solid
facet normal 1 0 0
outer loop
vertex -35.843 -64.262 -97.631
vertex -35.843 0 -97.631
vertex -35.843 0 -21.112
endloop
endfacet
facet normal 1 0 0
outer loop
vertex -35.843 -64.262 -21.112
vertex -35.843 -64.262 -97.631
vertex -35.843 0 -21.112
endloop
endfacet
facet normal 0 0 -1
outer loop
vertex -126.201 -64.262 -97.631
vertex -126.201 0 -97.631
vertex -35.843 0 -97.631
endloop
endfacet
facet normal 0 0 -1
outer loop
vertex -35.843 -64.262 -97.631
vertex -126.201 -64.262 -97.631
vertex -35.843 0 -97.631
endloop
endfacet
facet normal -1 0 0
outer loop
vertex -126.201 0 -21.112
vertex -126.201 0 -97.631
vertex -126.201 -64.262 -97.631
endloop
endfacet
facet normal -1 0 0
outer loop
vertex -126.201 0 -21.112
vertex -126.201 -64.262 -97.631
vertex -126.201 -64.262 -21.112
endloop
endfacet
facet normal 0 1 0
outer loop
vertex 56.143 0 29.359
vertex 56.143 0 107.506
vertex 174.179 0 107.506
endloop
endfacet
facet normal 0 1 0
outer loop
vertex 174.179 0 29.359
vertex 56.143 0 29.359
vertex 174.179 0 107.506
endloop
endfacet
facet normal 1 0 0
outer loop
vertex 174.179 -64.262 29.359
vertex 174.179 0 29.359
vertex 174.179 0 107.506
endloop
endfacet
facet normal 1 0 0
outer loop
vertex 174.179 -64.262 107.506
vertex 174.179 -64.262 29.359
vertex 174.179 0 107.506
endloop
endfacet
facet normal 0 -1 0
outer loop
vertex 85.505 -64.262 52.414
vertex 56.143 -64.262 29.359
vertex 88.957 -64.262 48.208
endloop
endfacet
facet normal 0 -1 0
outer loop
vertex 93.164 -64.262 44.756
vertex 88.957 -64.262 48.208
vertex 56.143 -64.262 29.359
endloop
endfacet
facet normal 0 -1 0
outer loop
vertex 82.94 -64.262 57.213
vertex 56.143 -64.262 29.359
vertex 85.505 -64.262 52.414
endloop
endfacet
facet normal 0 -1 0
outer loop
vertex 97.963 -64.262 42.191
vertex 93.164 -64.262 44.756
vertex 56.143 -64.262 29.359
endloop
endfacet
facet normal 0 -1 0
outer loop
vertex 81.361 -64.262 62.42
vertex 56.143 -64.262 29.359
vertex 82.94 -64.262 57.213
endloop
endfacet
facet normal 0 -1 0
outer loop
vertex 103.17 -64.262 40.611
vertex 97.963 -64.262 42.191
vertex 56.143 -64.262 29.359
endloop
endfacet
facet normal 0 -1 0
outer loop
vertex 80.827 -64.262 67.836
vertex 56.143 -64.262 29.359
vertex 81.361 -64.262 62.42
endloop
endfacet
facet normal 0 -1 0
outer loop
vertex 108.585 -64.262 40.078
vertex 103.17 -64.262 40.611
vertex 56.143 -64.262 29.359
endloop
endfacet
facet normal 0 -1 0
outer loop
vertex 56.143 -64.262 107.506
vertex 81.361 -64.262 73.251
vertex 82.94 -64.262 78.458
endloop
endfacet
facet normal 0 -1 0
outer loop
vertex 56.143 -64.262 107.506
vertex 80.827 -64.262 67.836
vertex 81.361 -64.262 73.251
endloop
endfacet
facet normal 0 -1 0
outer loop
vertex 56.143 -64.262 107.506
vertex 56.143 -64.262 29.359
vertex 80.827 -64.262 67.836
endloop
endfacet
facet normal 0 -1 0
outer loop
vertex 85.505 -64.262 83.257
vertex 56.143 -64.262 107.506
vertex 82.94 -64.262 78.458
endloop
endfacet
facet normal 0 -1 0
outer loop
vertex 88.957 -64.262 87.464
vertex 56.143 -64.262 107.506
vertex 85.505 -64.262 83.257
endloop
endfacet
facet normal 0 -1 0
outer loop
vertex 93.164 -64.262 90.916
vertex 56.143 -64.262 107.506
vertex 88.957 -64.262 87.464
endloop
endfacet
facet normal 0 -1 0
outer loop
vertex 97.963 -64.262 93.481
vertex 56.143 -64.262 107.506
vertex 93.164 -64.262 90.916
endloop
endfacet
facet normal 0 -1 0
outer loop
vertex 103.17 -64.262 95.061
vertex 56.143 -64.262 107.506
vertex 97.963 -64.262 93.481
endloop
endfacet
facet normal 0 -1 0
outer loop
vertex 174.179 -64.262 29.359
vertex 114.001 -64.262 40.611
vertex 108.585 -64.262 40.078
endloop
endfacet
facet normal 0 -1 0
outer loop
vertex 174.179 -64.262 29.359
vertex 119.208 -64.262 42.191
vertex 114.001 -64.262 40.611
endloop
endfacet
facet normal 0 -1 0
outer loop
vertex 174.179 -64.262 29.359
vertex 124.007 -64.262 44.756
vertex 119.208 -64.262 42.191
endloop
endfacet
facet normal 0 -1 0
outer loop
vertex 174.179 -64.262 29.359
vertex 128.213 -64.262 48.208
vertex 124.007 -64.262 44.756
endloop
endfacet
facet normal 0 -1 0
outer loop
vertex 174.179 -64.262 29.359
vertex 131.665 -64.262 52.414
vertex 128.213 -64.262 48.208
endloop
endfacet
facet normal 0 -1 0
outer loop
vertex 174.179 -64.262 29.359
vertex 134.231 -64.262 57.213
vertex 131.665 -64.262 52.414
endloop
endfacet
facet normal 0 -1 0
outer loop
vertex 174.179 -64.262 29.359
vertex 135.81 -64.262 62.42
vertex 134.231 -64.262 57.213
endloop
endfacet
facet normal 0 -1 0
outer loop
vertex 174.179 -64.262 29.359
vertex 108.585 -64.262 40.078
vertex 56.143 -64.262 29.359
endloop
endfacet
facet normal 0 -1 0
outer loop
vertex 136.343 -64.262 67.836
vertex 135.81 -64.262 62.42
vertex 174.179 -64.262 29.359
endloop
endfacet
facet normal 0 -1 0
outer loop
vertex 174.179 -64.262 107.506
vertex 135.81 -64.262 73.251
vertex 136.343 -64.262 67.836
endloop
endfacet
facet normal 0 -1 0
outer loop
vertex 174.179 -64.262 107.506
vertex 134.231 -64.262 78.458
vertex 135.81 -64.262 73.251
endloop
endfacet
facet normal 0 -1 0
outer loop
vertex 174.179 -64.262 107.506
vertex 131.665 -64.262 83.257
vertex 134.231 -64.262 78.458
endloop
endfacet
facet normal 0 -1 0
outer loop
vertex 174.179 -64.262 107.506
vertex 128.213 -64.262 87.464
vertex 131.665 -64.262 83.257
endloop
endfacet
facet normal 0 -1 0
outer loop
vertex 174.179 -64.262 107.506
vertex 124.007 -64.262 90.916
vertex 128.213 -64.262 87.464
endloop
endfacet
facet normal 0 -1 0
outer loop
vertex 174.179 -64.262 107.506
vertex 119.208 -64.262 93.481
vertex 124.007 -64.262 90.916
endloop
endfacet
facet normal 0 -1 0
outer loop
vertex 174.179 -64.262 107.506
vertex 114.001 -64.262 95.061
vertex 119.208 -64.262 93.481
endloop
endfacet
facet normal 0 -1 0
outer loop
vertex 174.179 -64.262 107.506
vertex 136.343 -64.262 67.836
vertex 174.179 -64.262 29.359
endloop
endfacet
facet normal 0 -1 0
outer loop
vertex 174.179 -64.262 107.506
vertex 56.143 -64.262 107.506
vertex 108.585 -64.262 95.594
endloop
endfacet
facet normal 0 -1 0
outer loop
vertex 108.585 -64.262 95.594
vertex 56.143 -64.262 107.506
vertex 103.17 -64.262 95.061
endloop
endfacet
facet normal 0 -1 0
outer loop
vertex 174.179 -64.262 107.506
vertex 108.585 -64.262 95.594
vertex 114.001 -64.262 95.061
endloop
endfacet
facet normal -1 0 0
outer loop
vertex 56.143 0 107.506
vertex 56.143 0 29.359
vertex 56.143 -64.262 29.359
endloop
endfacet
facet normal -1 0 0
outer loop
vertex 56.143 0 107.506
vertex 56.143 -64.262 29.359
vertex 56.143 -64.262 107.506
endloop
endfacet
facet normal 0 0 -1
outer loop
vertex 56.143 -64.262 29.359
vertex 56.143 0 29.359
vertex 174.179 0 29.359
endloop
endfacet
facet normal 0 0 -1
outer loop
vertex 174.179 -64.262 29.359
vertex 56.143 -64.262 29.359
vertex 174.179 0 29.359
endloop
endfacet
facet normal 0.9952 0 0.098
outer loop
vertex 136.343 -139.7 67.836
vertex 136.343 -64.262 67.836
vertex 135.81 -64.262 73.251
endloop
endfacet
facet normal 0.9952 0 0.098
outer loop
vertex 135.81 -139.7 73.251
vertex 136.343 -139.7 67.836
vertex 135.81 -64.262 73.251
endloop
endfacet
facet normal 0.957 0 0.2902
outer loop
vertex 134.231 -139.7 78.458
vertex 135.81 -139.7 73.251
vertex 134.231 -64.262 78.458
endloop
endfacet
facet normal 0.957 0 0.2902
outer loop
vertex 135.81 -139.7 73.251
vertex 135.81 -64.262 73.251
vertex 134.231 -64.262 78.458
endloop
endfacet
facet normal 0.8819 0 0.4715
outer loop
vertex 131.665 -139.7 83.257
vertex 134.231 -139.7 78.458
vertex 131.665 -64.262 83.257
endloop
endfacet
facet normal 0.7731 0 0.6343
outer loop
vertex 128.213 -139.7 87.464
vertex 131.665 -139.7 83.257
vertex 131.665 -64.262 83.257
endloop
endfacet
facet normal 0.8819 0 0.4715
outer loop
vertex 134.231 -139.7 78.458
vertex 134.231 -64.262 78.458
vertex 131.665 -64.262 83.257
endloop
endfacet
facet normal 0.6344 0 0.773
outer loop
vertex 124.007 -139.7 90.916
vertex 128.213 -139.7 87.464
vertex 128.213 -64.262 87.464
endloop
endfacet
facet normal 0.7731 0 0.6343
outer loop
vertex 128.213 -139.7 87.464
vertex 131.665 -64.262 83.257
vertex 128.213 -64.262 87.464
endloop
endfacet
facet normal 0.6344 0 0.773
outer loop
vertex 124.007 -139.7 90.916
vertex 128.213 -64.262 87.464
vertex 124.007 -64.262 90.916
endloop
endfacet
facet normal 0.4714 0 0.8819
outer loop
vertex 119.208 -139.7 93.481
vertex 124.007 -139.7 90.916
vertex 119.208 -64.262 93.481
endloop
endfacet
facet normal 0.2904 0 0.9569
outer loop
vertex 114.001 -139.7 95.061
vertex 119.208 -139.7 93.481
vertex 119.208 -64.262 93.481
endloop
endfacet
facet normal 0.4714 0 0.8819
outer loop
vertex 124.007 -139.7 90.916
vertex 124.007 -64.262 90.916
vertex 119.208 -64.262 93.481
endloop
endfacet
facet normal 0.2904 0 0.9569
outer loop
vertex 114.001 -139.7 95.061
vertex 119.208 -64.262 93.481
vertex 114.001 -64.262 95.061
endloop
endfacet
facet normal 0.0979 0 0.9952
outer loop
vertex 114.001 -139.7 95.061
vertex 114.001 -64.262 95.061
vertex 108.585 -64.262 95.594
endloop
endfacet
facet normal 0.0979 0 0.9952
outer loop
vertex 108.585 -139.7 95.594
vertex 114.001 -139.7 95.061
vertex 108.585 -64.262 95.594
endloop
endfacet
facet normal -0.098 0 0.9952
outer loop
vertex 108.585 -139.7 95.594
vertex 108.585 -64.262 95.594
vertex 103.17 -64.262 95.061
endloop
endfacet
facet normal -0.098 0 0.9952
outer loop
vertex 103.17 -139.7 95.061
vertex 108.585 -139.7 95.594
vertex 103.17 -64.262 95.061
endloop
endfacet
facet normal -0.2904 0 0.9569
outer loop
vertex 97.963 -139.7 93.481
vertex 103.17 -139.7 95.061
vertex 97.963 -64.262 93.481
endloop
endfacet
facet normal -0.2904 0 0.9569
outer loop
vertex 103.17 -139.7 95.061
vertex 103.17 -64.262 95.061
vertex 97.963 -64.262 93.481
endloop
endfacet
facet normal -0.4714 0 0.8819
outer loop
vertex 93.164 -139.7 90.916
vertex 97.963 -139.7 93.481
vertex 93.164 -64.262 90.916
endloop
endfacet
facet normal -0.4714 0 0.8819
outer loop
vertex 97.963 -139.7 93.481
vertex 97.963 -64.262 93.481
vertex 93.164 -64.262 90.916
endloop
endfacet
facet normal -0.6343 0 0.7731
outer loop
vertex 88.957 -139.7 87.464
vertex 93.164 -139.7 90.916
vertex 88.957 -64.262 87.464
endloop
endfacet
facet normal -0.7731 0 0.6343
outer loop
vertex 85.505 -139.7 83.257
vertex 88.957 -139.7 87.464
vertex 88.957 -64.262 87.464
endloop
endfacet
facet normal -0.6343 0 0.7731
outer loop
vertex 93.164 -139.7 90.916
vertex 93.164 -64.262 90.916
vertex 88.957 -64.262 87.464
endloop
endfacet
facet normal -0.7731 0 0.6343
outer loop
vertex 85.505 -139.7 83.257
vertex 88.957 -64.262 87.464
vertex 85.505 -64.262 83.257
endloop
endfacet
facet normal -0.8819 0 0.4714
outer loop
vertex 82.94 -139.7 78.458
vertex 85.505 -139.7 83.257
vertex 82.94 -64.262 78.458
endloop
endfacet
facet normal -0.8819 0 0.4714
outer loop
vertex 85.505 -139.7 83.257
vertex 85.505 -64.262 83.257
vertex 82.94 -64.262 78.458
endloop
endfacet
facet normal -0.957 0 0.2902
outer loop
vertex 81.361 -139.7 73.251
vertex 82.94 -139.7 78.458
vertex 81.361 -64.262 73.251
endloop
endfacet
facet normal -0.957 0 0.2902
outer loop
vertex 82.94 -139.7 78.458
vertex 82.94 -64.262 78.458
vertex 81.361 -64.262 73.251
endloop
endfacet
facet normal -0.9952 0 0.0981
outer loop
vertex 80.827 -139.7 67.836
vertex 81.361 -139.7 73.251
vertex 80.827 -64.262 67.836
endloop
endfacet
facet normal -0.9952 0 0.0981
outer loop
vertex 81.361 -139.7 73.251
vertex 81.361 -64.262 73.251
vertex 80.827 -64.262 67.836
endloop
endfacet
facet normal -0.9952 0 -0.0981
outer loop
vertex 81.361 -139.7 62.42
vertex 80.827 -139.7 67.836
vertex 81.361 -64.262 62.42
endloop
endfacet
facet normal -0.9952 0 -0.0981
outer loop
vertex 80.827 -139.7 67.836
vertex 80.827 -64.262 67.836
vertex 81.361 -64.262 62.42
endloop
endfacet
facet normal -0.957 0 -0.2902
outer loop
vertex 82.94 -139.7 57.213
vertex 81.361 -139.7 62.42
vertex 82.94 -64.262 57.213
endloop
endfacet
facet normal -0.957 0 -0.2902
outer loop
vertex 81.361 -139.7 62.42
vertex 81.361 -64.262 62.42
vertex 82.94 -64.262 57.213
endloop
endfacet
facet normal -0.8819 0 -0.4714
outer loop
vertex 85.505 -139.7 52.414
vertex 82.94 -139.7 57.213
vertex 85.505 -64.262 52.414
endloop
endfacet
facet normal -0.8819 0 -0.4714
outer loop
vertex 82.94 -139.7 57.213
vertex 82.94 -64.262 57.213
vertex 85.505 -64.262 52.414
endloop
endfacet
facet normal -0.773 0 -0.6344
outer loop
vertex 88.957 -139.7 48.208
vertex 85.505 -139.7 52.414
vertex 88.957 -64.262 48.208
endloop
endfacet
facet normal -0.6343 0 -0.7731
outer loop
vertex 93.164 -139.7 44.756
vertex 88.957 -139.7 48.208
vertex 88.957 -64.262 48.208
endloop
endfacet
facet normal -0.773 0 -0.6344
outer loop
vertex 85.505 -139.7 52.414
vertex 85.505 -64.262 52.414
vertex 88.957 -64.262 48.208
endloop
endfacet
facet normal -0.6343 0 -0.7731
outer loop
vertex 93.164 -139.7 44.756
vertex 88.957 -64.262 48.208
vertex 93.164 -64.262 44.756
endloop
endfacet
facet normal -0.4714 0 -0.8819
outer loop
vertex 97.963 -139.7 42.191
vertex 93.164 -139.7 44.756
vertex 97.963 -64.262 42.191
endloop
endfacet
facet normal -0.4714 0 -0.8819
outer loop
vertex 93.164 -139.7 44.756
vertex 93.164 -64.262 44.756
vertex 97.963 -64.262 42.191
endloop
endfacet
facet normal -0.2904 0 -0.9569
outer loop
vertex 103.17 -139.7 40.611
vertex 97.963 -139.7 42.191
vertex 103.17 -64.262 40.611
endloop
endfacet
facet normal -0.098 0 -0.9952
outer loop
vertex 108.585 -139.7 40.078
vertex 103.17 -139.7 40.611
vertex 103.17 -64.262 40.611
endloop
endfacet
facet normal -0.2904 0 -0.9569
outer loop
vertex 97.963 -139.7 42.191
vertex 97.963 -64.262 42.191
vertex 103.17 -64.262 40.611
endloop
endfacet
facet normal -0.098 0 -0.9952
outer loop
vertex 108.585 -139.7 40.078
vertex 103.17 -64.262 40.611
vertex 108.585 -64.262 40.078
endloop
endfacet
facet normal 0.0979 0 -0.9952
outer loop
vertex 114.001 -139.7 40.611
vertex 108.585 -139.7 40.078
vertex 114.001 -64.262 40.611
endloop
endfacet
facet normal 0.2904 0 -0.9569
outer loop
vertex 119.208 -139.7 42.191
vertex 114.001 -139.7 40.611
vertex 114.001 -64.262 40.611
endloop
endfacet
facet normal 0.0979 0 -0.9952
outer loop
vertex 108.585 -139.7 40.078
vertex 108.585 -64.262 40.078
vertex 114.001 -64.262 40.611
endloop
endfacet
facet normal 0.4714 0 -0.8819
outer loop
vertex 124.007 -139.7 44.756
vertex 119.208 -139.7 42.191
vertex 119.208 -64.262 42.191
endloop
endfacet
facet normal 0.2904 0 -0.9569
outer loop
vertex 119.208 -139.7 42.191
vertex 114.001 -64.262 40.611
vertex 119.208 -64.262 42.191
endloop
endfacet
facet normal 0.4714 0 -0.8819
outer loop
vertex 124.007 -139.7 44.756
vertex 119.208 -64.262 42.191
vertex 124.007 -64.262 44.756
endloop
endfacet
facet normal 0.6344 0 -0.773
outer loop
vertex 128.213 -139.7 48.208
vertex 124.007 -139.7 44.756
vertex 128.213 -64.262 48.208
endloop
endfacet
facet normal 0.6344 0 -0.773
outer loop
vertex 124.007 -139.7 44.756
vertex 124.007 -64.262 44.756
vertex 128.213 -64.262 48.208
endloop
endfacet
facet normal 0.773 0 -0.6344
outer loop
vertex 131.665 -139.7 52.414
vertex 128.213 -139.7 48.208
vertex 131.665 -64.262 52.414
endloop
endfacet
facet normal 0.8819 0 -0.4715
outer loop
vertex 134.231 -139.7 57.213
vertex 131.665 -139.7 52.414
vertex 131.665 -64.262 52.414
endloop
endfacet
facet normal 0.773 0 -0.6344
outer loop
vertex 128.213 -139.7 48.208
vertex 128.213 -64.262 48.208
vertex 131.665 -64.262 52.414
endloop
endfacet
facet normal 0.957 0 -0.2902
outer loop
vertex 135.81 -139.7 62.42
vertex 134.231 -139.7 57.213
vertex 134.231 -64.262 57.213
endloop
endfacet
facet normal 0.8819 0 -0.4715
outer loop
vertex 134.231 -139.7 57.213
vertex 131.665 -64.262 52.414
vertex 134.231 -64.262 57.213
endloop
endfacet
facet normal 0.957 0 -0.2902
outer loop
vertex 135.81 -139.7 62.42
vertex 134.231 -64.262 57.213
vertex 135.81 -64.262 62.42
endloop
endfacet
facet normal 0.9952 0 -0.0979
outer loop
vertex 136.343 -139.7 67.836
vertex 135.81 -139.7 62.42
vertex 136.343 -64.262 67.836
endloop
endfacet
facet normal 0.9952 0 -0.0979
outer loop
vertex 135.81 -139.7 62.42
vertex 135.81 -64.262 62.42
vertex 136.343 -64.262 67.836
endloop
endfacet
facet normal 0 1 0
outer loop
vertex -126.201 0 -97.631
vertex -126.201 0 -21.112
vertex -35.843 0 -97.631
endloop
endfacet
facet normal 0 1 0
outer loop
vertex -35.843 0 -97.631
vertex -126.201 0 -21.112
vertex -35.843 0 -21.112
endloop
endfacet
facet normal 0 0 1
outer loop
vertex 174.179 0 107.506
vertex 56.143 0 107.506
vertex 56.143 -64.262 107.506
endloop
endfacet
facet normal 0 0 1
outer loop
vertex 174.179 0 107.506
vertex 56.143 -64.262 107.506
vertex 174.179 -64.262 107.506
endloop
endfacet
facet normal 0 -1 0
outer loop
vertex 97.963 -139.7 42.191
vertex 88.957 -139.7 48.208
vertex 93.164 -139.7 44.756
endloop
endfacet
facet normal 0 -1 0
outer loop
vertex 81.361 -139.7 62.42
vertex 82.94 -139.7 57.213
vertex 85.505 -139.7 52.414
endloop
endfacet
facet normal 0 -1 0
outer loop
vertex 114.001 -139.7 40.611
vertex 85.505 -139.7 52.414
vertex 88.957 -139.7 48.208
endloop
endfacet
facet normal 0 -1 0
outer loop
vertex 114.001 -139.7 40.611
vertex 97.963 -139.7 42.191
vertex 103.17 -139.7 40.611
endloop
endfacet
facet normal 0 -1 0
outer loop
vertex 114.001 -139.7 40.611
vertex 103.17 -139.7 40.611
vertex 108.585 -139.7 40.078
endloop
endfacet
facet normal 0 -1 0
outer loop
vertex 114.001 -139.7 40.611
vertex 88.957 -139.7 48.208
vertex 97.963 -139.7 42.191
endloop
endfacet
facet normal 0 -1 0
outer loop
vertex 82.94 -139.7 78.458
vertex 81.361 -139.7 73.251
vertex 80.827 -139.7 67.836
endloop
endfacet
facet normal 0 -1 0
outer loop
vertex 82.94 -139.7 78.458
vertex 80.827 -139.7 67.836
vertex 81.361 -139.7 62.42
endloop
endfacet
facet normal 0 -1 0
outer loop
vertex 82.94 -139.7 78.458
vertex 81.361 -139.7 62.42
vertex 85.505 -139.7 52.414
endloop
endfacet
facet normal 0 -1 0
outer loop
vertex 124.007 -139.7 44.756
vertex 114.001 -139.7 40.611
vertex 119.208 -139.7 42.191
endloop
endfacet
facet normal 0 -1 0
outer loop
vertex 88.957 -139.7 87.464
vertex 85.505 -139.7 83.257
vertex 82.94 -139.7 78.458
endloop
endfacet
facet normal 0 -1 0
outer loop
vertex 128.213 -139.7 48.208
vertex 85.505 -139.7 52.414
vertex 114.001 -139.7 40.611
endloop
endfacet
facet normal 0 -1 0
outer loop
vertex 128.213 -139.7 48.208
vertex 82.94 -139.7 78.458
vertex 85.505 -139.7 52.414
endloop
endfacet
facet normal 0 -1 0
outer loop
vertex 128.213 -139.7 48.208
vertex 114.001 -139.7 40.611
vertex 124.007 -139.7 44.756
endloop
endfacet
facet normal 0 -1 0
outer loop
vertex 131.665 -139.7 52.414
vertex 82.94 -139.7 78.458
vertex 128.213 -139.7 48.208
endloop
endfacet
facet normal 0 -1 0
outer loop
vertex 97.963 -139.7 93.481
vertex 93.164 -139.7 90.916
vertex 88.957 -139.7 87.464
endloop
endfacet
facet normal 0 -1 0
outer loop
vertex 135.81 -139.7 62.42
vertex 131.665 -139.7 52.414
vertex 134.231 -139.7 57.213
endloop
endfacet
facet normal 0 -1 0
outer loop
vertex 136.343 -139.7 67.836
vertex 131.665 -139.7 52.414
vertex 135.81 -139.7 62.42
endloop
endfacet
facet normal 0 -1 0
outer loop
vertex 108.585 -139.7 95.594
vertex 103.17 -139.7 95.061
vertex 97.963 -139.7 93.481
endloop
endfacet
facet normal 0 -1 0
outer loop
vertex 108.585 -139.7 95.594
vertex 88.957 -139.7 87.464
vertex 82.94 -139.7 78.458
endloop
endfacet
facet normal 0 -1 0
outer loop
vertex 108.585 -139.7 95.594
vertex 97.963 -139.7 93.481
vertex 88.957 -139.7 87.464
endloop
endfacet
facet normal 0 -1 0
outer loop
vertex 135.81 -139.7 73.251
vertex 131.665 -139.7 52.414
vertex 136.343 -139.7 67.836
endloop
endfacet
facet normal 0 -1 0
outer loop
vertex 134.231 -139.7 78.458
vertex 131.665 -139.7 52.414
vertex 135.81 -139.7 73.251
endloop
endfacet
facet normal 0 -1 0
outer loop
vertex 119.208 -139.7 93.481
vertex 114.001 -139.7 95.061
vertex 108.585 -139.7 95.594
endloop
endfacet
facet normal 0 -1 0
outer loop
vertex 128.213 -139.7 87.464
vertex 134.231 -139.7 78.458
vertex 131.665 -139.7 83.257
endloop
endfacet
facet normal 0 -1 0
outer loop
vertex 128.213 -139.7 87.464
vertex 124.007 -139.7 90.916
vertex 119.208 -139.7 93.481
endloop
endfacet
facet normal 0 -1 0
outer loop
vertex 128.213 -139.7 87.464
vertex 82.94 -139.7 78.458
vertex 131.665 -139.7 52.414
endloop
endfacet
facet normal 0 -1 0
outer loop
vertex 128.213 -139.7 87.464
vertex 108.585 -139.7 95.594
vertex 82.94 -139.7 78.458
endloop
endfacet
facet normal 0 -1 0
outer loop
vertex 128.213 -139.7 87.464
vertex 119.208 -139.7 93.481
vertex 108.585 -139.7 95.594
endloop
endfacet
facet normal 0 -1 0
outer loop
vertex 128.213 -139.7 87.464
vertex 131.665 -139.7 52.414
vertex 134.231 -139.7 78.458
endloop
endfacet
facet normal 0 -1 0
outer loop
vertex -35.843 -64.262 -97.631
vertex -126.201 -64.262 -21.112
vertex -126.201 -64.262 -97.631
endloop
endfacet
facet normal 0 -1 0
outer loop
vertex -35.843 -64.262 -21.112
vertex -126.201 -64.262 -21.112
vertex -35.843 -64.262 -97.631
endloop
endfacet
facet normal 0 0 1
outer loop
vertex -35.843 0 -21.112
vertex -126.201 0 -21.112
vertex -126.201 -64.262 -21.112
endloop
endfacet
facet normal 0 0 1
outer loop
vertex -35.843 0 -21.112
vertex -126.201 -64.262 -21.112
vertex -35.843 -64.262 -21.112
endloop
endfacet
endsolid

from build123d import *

# Parameters (mm, degrees)
F0_W     = 90.358175
F0_H     = 76.519538
F0_W_2   = 118.03545
F0_H_2   = 78.147609
F1_DEPTH = 64.262
F2_R     = 27.758168
F3_DEPTH = 75.438


with BuildPart() as f1:
    # F0 (on Front) → F1 (new body)
    with BuildSketch(Plane.XZ):
        with Locations((-81.022006, -59.371373)):
            Rectangle(F0_W, F0_H)
        with Locations((115.161054, 68.43253)):
            Rectangle(F0_W_2, F0_H_2)
    extrude(amount=F1_DEPTH)

    # F2 (on face) → F3 (join)
    with BuildSketch(Plane.XZ.offset(64.262)):
        with Locations((108.585306, 67.8358)):
            Circle(F2_R)
    extrude(amount=F3_DEPTH)


solid = f1.part
